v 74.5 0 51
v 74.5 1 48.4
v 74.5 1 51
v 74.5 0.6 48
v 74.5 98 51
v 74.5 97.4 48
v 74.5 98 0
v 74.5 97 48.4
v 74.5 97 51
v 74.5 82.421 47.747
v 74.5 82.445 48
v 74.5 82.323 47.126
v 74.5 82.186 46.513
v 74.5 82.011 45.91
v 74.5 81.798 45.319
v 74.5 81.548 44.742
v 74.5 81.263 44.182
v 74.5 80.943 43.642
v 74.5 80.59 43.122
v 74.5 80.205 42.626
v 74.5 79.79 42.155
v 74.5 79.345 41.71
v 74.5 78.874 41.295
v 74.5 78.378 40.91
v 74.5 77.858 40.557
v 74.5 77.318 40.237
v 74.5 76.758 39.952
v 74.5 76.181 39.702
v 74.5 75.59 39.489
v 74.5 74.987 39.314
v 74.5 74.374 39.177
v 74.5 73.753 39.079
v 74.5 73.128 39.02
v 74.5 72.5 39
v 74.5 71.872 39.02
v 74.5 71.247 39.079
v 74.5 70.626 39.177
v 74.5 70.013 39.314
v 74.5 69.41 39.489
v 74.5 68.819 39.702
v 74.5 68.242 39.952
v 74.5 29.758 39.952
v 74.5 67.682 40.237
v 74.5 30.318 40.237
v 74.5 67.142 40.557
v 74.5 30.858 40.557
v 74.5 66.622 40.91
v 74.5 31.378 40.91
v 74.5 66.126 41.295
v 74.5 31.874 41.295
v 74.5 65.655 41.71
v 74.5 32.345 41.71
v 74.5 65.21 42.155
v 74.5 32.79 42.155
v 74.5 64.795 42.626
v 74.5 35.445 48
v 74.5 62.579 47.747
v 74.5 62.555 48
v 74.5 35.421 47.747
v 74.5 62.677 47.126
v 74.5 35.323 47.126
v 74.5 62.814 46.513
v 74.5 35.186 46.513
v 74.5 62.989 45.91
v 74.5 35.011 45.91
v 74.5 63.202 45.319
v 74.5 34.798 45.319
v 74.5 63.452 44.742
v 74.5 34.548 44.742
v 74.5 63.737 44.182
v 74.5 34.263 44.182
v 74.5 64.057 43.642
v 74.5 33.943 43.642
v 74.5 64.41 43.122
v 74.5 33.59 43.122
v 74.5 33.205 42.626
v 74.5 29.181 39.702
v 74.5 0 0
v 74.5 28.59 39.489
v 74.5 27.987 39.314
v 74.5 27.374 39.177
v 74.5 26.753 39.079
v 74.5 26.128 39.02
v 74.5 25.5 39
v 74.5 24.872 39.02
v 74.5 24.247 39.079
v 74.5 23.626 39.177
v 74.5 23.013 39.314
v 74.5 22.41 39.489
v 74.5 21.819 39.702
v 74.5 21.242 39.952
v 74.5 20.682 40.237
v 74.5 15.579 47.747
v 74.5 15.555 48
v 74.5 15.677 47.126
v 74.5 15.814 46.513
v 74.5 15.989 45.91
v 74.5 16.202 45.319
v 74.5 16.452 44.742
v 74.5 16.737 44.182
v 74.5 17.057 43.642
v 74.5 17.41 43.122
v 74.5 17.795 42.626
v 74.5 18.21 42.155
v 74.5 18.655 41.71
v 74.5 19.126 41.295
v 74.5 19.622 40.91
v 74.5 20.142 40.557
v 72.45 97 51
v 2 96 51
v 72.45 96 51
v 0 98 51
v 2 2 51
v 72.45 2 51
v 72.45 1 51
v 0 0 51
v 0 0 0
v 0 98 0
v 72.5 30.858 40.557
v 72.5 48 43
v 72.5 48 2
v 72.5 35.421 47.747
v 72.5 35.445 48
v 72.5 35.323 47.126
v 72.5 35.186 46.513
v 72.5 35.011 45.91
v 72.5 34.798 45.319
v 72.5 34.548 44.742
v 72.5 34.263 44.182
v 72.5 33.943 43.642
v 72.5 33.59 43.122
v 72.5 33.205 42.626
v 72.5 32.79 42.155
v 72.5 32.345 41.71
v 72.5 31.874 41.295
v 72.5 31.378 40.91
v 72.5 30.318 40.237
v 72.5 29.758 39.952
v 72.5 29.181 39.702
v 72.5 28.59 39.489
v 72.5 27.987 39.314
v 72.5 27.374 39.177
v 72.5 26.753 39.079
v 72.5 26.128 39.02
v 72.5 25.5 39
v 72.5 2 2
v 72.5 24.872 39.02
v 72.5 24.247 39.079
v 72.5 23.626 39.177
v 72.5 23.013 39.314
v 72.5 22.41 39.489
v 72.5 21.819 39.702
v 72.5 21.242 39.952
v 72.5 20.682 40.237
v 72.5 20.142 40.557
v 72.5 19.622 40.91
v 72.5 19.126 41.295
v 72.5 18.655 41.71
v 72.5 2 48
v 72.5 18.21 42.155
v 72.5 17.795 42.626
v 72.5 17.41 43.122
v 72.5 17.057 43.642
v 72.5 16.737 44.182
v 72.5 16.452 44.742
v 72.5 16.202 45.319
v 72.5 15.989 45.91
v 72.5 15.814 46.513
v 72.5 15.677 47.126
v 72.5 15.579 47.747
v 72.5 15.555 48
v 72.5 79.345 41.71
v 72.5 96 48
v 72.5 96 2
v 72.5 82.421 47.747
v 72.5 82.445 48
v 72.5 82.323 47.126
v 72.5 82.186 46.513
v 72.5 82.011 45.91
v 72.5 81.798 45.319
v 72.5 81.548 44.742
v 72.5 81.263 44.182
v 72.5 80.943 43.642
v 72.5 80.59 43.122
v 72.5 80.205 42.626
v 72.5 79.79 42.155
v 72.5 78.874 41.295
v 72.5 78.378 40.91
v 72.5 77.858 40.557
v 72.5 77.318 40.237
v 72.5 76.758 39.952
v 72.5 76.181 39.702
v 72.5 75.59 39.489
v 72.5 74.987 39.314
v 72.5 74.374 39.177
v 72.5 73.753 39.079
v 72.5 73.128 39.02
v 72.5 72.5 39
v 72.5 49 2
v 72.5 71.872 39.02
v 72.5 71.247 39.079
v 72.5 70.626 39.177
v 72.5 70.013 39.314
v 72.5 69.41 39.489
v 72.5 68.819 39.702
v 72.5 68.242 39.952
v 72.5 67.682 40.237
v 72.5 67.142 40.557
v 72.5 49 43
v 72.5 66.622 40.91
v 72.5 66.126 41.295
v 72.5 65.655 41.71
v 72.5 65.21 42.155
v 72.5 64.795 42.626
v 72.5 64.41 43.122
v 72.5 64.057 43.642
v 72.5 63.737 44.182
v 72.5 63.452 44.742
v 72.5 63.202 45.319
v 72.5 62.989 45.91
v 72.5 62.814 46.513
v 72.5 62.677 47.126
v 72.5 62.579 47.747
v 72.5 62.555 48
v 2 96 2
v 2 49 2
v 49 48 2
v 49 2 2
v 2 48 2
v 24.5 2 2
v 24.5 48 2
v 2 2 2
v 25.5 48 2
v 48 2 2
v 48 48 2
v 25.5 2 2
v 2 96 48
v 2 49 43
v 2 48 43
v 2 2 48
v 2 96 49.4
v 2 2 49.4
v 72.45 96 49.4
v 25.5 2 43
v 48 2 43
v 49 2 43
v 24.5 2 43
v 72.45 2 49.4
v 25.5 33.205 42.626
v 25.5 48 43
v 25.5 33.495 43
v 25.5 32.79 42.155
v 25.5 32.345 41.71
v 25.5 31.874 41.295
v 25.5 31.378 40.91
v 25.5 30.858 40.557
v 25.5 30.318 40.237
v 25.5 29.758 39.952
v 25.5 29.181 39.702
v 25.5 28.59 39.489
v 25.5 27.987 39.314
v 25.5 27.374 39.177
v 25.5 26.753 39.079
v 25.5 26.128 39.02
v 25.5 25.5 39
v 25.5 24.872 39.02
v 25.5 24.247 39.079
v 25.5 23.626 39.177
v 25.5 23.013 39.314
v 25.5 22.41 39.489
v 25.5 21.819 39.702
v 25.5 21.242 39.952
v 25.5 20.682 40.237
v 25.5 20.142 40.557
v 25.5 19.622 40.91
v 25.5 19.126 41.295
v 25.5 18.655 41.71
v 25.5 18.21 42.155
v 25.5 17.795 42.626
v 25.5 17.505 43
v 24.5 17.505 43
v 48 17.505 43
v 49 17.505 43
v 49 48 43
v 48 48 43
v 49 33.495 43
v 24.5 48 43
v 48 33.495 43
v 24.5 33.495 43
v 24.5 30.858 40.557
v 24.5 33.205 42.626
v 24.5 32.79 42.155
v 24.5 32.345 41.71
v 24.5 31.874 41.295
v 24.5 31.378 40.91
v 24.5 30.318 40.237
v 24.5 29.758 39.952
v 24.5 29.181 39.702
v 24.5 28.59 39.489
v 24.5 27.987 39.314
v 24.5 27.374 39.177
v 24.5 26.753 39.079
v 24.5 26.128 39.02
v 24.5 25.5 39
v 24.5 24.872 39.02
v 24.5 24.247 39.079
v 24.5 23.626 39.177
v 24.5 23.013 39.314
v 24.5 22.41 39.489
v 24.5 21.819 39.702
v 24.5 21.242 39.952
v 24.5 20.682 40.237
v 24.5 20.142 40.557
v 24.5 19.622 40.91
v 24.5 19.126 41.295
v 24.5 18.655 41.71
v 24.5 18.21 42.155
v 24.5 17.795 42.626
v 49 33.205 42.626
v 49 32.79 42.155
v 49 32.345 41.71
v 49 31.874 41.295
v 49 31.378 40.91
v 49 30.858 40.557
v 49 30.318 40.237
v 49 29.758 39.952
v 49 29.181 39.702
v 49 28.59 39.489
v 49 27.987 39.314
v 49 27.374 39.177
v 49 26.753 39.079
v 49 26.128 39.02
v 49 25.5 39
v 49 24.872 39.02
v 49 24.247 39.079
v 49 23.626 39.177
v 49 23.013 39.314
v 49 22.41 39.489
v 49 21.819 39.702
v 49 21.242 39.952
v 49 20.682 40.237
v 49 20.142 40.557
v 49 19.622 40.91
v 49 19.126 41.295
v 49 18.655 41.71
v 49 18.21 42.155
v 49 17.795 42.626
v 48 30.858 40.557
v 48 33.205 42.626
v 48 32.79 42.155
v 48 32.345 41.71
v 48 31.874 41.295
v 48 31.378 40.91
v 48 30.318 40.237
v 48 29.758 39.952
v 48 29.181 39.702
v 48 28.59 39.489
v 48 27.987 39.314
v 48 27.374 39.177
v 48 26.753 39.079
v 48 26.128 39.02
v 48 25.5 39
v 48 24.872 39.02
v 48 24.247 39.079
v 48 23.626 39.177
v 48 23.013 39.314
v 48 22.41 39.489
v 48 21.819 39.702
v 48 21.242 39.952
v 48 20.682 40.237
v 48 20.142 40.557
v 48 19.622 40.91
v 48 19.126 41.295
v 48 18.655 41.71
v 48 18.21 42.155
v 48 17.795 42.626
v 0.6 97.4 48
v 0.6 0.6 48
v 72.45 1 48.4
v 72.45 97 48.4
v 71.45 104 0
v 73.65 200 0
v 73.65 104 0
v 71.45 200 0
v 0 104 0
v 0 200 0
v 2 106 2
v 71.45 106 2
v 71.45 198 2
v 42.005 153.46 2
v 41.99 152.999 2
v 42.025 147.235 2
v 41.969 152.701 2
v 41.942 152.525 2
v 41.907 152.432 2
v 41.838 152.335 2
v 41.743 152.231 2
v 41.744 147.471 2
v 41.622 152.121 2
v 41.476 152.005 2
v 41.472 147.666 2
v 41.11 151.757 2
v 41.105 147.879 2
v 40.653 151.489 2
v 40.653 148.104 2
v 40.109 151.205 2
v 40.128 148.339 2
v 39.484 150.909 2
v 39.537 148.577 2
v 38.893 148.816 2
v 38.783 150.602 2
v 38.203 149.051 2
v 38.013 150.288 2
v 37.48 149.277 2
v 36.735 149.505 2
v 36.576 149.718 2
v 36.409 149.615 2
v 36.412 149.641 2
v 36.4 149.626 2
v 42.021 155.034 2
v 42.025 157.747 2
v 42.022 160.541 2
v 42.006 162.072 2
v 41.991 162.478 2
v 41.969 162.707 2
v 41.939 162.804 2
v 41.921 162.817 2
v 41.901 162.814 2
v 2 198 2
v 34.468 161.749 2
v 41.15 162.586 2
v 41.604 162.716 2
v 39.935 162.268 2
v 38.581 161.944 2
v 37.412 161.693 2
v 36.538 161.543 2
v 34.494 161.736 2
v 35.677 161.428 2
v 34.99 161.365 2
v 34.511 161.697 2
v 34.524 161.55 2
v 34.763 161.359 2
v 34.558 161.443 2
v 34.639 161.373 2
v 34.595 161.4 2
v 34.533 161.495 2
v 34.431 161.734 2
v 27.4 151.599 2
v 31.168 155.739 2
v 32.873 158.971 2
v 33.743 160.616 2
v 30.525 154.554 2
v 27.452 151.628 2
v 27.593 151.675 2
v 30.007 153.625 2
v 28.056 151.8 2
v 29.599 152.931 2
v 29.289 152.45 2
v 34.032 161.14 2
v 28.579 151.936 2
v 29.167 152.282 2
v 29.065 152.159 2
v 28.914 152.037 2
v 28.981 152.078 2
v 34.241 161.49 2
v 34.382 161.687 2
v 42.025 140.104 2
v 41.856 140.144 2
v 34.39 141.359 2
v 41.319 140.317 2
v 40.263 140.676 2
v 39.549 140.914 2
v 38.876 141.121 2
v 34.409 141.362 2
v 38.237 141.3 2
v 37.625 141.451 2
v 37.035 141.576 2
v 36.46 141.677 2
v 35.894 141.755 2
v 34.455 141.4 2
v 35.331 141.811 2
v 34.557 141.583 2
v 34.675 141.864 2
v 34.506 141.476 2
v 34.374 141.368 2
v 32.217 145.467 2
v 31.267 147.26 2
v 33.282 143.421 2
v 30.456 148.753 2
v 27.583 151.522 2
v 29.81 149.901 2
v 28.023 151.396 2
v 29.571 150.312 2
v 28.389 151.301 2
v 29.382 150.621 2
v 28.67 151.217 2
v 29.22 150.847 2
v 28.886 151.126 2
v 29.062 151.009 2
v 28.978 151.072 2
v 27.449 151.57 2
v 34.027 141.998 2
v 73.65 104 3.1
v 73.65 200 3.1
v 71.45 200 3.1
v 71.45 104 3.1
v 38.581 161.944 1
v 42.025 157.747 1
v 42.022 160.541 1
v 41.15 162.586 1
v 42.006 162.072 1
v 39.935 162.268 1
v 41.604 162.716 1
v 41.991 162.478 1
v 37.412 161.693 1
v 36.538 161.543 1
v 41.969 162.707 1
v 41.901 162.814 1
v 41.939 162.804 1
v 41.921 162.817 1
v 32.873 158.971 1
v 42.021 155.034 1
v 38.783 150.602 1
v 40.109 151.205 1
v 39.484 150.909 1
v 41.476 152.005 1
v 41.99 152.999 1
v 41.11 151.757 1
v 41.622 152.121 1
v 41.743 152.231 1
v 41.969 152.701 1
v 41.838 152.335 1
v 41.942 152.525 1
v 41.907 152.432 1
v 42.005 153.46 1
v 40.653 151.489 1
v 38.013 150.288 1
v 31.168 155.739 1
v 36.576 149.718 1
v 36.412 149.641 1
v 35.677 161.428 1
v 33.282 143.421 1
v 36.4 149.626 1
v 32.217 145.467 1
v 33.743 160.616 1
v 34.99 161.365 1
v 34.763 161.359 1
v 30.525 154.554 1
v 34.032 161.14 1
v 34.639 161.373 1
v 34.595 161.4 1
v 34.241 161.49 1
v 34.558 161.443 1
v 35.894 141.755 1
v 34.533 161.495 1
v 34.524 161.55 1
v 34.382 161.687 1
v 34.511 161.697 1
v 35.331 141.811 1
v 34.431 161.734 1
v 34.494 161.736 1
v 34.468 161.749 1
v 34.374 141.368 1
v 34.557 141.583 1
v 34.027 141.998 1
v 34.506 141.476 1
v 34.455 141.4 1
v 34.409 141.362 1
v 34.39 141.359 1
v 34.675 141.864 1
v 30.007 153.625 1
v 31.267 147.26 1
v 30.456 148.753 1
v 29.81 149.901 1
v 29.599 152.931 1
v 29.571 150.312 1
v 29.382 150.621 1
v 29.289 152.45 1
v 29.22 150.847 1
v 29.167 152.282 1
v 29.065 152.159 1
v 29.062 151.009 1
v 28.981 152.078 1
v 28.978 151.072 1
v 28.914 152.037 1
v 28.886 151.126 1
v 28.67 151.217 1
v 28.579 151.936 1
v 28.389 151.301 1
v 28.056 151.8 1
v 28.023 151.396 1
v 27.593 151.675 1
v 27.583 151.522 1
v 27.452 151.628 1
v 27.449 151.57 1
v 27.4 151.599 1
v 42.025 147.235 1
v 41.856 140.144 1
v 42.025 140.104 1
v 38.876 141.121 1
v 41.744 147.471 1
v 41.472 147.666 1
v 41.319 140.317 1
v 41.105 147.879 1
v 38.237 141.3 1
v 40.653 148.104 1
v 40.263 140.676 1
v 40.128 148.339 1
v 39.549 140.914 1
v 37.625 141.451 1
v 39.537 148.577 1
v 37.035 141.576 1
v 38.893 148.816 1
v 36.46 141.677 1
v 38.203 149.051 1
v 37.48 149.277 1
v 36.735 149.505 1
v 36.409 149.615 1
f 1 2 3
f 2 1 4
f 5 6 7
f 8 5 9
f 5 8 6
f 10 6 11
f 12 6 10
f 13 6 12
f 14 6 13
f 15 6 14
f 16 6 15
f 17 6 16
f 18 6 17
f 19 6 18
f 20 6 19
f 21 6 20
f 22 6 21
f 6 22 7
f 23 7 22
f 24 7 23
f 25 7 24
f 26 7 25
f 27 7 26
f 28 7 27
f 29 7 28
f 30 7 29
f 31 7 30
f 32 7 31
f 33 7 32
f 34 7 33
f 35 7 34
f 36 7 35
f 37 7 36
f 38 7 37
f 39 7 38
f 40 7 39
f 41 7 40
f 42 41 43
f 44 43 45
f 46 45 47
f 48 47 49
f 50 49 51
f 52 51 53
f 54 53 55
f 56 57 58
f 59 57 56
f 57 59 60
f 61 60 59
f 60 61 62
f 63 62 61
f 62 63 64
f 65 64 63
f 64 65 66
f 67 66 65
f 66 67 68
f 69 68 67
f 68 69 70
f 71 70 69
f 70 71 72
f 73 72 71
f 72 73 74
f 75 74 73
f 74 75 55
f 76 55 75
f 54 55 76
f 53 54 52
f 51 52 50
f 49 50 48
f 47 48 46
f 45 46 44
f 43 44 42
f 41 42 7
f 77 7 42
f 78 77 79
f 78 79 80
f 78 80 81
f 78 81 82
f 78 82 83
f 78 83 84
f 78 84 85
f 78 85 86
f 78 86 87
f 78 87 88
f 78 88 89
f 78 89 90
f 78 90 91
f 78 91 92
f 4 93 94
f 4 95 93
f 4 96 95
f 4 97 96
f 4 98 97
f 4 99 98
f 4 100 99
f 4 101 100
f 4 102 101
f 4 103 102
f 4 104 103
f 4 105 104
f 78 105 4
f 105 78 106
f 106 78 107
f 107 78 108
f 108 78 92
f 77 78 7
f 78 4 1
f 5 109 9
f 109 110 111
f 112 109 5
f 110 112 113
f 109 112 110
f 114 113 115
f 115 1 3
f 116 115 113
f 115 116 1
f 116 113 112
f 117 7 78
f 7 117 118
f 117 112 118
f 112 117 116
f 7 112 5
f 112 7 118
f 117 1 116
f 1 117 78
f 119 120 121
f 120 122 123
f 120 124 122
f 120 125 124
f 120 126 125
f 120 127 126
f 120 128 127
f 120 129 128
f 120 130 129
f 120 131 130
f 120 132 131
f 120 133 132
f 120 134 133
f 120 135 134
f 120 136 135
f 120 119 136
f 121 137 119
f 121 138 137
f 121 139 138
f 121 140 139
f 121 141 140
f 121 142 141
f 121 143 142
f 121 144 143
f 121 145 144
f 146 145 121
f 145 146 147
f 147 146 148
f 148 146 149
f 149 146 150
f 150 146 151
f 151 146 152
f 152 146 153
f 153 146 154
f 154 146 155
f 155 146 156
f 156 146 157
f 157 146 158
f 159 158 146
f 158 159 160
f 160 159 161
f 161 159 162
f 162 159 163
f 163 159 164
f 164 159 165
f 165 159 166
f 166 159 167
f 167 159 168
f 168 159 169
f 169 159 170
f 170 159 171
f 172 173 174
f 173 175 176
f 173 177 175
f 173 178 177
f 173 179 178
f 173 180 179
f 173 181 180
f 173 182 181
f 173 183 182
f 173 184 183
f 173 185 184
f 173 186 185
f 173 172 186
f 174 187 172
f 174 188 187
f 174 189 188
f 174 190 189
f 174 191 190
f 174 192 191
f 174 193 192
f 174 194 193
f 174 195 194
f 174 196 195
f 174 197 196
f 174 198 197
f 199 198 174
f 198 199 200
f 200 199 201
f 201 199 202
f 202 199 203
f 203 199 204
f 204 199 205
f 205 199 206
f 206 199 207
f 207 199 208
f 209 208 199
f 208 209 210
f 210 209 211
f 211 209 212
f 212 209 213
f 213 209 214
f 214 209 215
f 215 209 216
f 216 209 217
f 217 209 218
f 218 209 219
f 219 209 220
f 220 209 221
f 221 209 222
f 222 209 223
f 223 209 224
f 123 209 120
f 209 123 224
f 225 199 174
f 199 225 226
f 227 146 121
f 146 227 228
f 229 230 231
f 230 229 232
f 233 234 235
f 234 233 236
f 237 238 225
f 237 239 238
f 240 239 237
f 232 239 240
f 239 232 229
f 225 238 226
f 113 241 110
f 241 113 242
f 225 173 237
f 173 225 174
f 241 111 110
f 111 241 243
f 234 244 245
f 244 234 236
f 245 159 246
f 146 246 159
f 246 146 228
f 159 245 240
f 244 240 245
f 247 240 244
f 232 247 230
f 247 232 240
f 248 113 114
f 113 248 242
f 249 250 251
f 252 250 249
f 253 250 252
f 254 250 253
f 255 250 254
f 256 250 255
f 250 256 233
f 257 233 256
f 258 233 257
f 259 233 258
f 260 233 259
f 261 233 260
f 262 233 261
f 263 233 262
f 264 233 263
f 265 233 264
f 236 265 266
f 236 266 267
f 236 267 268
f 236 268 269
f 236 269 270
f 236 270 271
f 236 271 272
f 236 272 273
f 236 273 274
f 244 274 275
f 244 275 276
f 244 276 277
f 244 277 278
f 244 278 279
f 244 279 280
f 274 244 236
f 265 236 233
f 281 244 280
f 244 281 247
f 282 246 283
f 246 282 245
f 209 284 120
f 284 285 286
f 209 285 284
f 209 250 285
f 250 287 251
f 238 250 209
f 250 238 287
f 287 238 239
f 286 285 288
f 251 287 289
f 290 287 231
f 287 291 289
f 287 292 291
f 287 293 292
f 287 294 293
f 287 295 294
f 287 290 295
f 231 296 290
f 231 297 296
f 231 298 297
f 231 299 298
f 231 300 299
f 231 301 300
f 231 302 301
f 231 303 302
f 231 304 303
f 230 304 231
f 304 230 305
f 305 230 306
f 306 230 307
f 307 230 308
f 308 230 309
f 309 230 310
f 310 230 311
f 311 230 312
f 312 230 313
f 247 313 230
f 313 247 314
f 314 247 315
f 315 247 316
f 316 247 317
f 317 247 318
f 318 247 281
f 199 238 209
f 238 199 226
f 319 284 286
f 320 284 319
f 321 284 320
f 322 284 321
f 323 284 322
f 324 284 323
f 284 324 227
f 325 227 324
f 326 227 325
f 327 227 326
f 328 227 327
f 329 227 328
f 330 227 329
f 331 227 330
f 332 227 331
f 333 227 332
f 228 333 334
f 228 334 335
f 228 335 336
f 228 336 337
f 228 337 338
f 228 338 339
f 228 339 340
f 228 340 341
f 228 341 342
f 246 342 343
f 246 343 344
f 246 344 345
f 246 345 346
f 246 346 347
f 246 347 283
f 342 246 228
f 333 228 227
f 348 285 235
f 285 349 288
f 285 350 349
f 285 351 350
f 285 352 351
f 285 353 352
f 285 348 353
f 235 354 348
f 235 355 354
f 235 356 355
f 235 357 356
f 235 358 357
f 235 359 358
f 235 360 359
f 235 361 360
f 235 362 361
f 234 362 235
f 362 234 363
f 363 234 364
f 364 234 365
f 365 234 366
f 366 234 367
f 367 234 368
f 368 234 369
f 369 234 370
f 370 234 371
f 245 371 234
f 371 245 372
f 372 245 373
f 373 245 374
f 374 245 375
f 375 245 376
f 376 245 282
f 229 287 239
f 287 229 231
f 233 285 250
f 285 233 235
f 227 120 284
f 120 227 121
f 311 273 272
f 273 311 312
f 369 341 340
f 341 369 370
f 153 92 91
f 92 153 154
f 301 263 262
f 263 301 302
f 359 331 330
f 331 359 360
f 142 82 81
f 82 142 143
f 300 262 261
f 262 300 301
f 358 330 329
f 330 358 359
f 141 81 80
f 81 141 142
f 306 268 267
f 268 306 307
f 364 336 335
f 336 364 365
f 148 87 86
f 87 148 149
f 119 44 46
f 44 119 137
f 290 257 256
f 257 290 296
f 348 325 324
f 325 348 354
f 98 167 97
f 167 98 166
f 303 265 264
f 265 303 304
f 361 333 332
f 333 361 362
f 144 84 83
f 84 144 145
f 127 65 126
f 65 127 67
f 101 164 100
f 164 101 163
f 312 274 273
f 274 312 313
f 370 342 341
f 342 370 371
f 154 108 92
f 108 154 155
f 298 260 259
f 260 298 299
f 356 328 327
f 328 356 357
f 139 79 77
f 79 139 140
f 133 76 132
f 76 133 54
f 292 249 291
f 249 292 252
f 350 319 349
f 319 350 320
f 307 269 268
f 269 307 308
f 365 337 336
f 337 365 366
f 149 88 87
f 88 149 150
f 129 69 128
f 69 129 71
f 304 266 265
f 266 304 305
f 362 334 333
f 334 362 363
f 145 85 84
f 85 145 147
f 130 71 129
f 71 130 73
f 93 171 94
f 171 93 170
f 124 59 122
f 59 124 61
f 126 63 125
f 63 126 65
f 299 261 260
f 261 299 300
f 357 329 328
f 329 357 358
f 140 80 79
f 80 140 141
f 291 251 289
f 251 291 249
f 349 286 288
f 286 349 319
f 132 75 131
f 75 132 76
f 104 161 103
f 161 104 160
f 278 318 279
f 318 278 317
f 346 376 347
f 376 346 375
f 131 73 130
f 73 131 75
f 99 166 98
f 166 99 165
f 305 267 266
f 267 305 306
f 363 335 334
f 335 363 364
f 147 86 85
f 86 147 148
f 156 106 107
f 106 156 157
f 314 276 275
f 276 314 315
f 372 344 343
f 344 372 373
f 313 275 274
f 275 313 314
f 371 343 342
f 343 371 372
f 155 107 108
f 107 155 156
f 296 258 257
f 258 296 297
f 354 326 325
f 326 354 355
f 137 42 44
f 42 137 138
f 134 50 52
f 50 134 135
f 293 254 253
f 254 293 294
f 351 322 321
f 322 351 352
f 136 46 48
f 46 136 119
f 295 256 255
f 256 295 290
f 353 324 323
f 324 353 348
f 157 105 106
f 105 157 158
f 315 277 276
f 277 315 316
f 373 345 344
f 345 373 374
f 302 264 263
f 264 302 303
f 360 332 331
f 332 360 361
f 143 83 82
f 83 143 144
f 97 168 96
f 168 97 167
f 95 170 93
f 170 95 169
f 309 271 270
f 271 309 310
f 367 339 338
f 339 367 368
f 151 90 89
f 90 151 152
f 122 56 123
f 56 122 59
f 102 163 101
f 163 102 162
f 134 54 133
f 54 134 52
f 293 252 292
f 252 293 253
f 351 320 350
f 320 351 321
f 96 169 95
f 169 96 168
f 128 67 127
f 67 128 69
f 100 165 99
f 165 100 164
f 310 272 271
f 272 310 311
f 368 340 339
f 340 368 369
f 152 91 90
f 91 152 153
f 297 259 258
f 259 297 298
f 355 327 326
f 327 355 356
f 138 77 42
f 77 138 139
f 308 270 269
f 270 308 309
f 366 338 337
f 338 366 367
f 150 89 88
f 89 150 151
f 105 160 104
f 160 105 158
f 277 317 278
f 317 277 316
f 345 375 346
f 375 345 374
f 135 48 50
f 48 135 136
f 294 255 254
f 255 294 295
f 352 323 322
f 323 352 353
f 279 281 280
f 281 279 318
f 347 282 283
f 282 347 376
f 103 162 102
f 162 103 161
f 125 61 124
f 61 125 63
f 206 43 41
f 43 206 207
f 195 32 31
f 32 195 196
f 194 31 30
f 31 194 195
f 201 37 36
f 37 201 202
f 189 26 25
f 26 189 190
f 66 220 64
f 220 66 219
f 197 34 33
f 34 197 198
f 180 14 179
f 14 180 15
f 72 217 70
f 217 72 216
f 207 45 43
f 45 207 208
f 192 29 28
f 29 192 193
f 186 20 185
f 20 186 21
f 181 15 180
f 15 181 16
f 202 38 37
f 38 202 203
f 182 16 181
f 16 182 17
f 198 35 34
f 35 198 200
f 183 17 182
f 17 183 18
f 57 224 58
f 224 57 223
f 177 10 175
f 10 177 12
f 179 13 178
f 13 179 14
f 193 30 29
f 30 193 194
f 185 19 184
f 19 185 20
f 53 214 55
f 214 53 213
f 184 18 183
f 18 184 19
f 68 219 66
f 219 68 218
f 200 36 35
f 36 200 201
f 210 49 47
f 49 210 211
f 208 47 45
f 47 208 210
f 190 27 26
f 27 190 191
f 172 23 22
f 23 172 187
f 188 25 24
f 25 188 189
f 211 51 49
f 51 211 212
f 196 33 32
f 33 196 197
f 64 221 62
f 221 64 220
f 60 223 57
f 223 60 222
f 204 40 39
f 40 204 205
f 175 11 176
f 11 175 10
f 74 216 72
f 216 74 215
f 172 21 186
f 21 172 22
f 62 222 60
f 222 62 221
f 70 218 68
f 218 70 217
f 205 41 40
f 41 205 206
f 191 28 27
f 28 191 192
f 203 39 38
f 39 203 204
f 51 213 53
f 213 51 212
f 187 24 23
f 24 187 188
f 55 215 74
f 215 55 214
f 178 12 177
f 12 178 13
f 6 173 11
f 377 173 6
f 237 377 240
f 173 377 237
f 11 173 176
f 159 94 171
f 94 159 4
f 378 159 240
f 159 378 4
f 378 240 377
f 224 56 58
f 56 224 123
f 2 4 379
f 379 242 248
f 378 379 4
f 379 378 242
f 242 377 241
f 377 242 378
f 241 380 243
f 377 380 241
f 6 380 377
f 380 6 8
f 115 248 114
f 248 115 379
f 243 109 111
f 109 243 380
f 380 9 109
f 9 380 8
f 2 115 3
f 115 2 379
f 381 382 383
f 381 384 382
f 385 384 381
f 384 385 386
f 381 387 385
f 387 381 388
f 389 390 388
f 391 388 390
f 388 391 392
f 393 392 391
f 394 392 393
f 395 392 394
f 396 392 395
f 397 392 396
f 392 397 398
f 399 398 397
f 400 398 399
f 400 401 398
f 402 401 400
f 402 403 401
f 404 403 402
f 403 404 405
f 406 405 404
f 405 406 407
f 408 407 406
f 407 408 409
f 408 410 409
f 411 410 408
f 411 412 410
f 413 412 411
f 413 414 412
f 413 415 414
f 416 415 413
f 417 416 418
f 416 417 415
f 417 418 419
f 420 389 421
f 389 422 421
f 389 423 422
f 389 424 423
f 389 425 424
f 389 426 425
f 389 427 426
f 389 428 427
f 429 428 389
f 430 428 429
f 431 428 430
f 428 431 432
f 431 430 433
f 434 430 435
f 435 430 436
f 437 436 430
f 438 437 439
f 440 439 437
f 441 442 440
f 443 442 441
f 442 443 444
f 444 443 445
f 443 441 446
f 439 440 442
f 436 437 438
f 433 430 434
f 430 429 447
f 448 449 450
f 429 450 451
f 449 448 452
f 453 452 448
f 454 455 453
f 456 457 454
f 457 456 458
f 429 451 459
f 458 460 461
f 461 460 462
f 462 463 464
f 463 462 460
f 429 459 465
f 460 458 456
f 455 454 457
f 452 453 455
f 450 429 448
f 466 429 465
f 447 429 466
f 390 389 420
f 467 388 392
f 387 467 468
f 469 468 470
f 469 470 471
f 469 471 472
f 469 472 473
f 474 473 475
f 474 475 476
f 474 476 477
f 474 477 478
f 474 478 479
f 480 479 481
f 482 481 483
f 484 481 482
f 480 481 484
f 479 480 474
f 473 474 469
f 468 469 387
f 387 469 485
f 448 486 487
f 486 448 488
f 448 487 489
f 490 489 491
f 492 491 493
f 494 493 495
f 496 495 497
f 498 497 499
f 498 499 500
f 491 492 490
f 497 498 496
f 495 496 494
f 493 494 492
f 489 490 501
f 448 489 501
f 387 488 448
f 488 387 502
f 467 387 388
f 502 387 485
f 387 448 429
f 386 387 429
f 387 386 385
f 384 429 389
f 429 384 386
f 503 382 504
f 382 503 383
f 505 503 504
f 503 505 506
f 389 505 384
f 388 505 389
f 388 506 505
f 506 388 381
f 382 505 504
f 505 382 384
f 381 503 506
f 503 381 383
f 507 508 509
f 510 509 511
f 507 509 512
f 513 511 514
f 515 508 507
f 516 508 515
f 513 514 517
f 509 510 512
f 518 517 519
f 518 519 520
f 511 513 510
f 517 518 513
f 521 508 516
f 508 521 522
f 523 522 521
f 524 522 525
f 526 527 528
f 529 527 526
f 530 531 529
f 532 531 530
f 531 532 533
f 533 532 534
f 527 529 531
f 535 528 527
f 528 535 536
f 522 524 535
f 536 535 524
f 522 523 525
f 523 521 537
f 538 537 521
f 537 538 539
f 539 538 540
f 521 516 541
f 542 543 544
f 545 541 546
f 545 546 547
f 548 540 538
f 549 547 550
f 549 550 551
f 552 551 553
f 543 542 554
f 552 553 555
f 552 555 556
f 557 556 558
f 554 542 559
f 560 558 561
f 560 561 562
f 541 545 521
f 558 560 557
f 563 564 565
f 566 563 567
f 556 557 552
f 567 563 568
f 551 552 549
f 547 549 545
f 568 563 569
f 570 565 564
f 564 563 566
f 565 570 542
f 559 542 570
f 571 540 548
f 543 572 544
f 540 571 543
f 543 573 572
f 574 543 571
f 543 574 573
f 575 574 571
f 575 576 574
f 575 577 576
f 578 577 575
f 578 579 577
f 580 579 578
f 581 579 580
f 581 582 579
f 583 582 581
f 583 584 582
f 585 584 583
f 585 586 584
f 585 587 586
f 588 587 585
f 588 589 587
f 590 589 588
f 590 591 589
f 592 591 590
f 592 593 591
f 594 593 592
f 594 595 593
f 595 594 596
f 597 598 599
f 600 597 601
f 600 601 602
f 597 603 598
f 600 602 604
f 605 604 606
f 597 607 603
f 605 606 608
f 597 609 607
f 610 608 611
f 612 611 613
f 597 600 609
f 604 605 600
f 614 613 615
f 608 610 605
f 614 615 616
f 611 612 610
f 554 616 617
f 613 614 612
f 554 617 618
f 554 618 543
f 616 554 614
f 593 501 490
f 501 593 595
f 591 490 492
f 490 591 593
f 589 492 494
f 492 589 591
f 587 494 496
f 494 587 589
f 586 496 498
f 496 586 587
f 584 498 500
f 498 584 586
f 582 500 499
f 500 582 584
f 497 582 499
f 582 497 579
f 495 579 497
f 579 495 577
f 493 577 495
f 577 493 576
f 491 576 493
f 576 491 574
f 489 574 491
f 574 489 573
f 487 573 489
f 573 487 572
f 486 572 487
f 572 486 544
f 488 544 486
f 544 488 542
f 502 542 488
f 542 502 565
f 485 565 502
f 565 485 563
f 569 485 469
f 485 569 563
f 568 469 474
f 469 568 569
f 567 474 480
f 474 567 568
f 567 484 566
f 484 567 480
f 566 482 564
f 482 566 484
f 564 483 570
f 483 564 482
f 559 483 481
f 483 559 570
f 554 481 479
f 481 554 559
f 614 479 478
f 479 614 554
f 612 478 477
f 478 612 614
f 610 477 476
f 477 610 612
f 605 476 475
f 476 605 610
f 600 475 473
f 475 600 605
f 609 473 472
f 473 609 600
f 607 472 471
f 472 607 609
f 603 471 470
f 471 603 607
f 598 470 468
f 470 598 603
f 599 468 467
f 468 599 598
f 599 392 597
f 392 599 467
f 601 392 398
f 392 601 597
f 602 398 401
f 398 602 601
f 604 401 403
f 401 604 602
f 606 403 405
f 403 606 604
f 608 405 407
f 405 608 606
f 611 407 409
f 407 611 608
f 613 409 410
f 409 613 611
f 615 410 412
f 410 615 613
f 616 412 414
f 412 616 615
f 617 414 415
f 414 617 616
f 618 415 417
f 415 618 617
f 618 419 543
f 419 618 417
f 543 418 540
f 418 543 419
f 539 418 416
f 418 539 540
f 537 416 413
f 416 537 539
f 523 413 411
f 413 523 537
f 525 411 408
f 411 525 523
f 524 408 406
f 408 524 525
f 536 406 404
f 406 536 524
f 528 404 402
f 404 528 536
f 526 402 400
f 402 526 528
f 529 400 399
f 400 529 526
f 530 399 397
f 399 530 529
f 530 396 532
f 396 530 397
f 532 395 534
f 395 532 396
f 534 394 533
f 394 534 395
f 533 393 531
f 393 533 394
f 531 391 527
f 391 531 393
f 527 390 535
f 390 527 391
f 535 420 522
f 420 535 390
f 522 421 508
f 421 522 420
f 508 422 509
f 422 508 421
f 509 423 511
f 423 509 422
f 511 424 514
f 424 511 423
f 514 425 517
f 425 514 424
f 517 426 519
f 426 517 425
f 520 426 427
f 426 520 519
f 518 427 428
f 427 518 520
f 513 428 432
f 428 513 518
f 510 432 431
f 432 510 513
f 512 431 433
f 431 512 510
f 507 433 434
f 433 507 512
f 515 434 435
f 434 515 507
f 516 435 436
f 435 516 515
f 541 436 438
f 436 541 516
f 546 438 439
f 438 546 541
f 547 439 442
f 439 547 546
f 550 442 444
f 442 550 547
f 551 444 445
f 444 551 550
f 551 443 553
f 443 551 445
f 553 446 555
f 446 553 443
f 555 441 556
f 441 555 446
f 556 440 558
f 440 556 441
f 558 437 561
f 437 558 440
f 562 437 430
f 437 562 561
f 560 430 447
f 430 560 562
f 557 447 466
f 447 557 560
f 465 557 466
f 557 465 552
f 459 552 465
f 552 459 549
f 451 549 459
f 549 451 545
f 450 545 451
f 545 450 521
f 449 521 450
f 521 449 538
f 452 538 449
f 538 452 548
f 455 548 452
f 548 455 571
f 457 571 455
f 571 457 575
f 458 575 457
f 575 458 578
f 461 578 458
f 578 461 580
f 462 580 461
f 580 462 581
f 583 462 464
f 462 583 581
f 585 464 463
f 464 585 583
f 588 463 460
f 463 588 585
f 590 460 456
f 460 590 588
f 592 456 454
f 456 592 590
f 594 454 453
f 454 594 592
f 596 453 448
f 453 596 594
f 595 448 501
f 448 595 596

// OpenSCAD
// file: carcassonne_box.scad
/**
 * @file carcassonne_box.scad
 * @author Conlan Wesson
 * Template for Carcossonne boxes.
 * @copyright Creative Commons Attribution-NonCommercial-ShareAlike 4.0
 */

mm = 1;
cm = 10*mm;

width = 47*mm;
thick = 2.5*mm;
wall = 2*mm;

/**
 * Lid for box.
 * @param count Number of cards.
 * @param columns Number of columns.
 * @param icon Path to icon DXF file.
 * @param rot Icon rotation in degrees.
 * @param mult Icon scale.
 * @param xoff X-offset of icon from center.
 * @param yoff Y-offset of icon from center.
 */
module carcassonne_lid(count, columns=1, icon=false, rot=0, mult=1, xoff=0, yoff=0, g=0){
	length = (thick * count) + ((width/2) - ((thick * count) % (width/2)));
	w = length+(1.5*wall)+.1;
	l = (width*columns)+wall;
	h = wall;
	d = 2;

	CubePoints = [
		[ 0-g, 0-g,   0 ],  //0
		[ w+g, 0-g,   0 ],  //1
		[ w+g, l+g,   0 ],  //2
		[ 0-g, l+g,   0 ],  //3
		[   d,   d, h+g ],  //4
		[   w,   d, h+g ],  //5
		[   w, l-d, h+g ],  //6
		[   d, l-d, h+g ]   //7
	];
	
	CubeFaces = [
		[0,1,2,3],  // bottom
		[4,5,1,0],  // front
		[7,6,5,4],  // top
		[5,6,2,1],  // right
		[6,7,3,2],  // back
		[7,4,0,3]   // left
	];
	
	
	difference(){
		union(){
			polyhedron( CubePoints, CubeFaces );
			translate([w-wall-.15,0,0]) cube([wall+.2,l, (1.5*wall)+.1]);
		}
		if(icon){
			translate([w/2+xoff,l/3+yoff,h-(wall/2)]){
				linear_extrude(height=(wall)+.1){
					rotate(rot) scale(mult) import(icon);
				}
			}
		}
	}
}

/**
 * Carcassonne card box.
 * @param count Number of cards.
 * @param dividers Array of divider positions.
 * @param columns Number of columns.
 */
module carcassonne_box(count, dividers=[], columns=1){
	length = (thick * count) + ((width/2) - ((thick * count) % (width/2)));
	difference(){
		union(){
			difference(){
				// Outer walls
				cube([length+(2*wall), (width*columns)+(2*wall), width+(2*wall)]);
				// Cavity
				translate([wall, wall, wall]){
					cube([length, width*columns, (width+wall)+.1]);
				}
			}
			// Dividers
			for(col = [0:columns-1]){
				for(div = dividers[col]){
					translate([(div*(width/2))+(wall/2), width*col+wall, 0]) cube([wall/2, width, width-(2*wall)]);
				}
				if(col > 0){
					translate([0, width*col+(wall/2), 0]) cube([length+(2*wall), wall/2, width-(2*wall)]);
				}
			}
		}
		union(){
			// Notch
			for(col = [0:columns-1]){
				translate([wall, wall+(width*col), wall]){
					translate([0, width/2, width])
					rotate([0, 90, 0]){
						cylinder(r=10, h=length+(2*wall), $fn=100);
					}
				}
			}
			// Track
			translate([wall/2,wall/2,width+wall/2]) carcassonne_lid(count, columns, g=0.4);
		}
	}
}
// main file
/**
 * @file underbigtop.scad
 * @author Conlan Wesson
 * Under the Big Top Carcossonne box.
 * @copyright Creative Commons Attribution-NonCommercial-ShareAlike 4.0
 */

include <carcassonne_box.scad>

count = 20;
dividers = [[1, 2]];
columns = 2;

carcassonne_box(count, dividers, columns);
translate([0,width*columns+10,0]) carcassonne_lid(count, columns, icon="underbigtop.dxf", rot=-90, mult=0.075, xoff=-10, yoff=28);
